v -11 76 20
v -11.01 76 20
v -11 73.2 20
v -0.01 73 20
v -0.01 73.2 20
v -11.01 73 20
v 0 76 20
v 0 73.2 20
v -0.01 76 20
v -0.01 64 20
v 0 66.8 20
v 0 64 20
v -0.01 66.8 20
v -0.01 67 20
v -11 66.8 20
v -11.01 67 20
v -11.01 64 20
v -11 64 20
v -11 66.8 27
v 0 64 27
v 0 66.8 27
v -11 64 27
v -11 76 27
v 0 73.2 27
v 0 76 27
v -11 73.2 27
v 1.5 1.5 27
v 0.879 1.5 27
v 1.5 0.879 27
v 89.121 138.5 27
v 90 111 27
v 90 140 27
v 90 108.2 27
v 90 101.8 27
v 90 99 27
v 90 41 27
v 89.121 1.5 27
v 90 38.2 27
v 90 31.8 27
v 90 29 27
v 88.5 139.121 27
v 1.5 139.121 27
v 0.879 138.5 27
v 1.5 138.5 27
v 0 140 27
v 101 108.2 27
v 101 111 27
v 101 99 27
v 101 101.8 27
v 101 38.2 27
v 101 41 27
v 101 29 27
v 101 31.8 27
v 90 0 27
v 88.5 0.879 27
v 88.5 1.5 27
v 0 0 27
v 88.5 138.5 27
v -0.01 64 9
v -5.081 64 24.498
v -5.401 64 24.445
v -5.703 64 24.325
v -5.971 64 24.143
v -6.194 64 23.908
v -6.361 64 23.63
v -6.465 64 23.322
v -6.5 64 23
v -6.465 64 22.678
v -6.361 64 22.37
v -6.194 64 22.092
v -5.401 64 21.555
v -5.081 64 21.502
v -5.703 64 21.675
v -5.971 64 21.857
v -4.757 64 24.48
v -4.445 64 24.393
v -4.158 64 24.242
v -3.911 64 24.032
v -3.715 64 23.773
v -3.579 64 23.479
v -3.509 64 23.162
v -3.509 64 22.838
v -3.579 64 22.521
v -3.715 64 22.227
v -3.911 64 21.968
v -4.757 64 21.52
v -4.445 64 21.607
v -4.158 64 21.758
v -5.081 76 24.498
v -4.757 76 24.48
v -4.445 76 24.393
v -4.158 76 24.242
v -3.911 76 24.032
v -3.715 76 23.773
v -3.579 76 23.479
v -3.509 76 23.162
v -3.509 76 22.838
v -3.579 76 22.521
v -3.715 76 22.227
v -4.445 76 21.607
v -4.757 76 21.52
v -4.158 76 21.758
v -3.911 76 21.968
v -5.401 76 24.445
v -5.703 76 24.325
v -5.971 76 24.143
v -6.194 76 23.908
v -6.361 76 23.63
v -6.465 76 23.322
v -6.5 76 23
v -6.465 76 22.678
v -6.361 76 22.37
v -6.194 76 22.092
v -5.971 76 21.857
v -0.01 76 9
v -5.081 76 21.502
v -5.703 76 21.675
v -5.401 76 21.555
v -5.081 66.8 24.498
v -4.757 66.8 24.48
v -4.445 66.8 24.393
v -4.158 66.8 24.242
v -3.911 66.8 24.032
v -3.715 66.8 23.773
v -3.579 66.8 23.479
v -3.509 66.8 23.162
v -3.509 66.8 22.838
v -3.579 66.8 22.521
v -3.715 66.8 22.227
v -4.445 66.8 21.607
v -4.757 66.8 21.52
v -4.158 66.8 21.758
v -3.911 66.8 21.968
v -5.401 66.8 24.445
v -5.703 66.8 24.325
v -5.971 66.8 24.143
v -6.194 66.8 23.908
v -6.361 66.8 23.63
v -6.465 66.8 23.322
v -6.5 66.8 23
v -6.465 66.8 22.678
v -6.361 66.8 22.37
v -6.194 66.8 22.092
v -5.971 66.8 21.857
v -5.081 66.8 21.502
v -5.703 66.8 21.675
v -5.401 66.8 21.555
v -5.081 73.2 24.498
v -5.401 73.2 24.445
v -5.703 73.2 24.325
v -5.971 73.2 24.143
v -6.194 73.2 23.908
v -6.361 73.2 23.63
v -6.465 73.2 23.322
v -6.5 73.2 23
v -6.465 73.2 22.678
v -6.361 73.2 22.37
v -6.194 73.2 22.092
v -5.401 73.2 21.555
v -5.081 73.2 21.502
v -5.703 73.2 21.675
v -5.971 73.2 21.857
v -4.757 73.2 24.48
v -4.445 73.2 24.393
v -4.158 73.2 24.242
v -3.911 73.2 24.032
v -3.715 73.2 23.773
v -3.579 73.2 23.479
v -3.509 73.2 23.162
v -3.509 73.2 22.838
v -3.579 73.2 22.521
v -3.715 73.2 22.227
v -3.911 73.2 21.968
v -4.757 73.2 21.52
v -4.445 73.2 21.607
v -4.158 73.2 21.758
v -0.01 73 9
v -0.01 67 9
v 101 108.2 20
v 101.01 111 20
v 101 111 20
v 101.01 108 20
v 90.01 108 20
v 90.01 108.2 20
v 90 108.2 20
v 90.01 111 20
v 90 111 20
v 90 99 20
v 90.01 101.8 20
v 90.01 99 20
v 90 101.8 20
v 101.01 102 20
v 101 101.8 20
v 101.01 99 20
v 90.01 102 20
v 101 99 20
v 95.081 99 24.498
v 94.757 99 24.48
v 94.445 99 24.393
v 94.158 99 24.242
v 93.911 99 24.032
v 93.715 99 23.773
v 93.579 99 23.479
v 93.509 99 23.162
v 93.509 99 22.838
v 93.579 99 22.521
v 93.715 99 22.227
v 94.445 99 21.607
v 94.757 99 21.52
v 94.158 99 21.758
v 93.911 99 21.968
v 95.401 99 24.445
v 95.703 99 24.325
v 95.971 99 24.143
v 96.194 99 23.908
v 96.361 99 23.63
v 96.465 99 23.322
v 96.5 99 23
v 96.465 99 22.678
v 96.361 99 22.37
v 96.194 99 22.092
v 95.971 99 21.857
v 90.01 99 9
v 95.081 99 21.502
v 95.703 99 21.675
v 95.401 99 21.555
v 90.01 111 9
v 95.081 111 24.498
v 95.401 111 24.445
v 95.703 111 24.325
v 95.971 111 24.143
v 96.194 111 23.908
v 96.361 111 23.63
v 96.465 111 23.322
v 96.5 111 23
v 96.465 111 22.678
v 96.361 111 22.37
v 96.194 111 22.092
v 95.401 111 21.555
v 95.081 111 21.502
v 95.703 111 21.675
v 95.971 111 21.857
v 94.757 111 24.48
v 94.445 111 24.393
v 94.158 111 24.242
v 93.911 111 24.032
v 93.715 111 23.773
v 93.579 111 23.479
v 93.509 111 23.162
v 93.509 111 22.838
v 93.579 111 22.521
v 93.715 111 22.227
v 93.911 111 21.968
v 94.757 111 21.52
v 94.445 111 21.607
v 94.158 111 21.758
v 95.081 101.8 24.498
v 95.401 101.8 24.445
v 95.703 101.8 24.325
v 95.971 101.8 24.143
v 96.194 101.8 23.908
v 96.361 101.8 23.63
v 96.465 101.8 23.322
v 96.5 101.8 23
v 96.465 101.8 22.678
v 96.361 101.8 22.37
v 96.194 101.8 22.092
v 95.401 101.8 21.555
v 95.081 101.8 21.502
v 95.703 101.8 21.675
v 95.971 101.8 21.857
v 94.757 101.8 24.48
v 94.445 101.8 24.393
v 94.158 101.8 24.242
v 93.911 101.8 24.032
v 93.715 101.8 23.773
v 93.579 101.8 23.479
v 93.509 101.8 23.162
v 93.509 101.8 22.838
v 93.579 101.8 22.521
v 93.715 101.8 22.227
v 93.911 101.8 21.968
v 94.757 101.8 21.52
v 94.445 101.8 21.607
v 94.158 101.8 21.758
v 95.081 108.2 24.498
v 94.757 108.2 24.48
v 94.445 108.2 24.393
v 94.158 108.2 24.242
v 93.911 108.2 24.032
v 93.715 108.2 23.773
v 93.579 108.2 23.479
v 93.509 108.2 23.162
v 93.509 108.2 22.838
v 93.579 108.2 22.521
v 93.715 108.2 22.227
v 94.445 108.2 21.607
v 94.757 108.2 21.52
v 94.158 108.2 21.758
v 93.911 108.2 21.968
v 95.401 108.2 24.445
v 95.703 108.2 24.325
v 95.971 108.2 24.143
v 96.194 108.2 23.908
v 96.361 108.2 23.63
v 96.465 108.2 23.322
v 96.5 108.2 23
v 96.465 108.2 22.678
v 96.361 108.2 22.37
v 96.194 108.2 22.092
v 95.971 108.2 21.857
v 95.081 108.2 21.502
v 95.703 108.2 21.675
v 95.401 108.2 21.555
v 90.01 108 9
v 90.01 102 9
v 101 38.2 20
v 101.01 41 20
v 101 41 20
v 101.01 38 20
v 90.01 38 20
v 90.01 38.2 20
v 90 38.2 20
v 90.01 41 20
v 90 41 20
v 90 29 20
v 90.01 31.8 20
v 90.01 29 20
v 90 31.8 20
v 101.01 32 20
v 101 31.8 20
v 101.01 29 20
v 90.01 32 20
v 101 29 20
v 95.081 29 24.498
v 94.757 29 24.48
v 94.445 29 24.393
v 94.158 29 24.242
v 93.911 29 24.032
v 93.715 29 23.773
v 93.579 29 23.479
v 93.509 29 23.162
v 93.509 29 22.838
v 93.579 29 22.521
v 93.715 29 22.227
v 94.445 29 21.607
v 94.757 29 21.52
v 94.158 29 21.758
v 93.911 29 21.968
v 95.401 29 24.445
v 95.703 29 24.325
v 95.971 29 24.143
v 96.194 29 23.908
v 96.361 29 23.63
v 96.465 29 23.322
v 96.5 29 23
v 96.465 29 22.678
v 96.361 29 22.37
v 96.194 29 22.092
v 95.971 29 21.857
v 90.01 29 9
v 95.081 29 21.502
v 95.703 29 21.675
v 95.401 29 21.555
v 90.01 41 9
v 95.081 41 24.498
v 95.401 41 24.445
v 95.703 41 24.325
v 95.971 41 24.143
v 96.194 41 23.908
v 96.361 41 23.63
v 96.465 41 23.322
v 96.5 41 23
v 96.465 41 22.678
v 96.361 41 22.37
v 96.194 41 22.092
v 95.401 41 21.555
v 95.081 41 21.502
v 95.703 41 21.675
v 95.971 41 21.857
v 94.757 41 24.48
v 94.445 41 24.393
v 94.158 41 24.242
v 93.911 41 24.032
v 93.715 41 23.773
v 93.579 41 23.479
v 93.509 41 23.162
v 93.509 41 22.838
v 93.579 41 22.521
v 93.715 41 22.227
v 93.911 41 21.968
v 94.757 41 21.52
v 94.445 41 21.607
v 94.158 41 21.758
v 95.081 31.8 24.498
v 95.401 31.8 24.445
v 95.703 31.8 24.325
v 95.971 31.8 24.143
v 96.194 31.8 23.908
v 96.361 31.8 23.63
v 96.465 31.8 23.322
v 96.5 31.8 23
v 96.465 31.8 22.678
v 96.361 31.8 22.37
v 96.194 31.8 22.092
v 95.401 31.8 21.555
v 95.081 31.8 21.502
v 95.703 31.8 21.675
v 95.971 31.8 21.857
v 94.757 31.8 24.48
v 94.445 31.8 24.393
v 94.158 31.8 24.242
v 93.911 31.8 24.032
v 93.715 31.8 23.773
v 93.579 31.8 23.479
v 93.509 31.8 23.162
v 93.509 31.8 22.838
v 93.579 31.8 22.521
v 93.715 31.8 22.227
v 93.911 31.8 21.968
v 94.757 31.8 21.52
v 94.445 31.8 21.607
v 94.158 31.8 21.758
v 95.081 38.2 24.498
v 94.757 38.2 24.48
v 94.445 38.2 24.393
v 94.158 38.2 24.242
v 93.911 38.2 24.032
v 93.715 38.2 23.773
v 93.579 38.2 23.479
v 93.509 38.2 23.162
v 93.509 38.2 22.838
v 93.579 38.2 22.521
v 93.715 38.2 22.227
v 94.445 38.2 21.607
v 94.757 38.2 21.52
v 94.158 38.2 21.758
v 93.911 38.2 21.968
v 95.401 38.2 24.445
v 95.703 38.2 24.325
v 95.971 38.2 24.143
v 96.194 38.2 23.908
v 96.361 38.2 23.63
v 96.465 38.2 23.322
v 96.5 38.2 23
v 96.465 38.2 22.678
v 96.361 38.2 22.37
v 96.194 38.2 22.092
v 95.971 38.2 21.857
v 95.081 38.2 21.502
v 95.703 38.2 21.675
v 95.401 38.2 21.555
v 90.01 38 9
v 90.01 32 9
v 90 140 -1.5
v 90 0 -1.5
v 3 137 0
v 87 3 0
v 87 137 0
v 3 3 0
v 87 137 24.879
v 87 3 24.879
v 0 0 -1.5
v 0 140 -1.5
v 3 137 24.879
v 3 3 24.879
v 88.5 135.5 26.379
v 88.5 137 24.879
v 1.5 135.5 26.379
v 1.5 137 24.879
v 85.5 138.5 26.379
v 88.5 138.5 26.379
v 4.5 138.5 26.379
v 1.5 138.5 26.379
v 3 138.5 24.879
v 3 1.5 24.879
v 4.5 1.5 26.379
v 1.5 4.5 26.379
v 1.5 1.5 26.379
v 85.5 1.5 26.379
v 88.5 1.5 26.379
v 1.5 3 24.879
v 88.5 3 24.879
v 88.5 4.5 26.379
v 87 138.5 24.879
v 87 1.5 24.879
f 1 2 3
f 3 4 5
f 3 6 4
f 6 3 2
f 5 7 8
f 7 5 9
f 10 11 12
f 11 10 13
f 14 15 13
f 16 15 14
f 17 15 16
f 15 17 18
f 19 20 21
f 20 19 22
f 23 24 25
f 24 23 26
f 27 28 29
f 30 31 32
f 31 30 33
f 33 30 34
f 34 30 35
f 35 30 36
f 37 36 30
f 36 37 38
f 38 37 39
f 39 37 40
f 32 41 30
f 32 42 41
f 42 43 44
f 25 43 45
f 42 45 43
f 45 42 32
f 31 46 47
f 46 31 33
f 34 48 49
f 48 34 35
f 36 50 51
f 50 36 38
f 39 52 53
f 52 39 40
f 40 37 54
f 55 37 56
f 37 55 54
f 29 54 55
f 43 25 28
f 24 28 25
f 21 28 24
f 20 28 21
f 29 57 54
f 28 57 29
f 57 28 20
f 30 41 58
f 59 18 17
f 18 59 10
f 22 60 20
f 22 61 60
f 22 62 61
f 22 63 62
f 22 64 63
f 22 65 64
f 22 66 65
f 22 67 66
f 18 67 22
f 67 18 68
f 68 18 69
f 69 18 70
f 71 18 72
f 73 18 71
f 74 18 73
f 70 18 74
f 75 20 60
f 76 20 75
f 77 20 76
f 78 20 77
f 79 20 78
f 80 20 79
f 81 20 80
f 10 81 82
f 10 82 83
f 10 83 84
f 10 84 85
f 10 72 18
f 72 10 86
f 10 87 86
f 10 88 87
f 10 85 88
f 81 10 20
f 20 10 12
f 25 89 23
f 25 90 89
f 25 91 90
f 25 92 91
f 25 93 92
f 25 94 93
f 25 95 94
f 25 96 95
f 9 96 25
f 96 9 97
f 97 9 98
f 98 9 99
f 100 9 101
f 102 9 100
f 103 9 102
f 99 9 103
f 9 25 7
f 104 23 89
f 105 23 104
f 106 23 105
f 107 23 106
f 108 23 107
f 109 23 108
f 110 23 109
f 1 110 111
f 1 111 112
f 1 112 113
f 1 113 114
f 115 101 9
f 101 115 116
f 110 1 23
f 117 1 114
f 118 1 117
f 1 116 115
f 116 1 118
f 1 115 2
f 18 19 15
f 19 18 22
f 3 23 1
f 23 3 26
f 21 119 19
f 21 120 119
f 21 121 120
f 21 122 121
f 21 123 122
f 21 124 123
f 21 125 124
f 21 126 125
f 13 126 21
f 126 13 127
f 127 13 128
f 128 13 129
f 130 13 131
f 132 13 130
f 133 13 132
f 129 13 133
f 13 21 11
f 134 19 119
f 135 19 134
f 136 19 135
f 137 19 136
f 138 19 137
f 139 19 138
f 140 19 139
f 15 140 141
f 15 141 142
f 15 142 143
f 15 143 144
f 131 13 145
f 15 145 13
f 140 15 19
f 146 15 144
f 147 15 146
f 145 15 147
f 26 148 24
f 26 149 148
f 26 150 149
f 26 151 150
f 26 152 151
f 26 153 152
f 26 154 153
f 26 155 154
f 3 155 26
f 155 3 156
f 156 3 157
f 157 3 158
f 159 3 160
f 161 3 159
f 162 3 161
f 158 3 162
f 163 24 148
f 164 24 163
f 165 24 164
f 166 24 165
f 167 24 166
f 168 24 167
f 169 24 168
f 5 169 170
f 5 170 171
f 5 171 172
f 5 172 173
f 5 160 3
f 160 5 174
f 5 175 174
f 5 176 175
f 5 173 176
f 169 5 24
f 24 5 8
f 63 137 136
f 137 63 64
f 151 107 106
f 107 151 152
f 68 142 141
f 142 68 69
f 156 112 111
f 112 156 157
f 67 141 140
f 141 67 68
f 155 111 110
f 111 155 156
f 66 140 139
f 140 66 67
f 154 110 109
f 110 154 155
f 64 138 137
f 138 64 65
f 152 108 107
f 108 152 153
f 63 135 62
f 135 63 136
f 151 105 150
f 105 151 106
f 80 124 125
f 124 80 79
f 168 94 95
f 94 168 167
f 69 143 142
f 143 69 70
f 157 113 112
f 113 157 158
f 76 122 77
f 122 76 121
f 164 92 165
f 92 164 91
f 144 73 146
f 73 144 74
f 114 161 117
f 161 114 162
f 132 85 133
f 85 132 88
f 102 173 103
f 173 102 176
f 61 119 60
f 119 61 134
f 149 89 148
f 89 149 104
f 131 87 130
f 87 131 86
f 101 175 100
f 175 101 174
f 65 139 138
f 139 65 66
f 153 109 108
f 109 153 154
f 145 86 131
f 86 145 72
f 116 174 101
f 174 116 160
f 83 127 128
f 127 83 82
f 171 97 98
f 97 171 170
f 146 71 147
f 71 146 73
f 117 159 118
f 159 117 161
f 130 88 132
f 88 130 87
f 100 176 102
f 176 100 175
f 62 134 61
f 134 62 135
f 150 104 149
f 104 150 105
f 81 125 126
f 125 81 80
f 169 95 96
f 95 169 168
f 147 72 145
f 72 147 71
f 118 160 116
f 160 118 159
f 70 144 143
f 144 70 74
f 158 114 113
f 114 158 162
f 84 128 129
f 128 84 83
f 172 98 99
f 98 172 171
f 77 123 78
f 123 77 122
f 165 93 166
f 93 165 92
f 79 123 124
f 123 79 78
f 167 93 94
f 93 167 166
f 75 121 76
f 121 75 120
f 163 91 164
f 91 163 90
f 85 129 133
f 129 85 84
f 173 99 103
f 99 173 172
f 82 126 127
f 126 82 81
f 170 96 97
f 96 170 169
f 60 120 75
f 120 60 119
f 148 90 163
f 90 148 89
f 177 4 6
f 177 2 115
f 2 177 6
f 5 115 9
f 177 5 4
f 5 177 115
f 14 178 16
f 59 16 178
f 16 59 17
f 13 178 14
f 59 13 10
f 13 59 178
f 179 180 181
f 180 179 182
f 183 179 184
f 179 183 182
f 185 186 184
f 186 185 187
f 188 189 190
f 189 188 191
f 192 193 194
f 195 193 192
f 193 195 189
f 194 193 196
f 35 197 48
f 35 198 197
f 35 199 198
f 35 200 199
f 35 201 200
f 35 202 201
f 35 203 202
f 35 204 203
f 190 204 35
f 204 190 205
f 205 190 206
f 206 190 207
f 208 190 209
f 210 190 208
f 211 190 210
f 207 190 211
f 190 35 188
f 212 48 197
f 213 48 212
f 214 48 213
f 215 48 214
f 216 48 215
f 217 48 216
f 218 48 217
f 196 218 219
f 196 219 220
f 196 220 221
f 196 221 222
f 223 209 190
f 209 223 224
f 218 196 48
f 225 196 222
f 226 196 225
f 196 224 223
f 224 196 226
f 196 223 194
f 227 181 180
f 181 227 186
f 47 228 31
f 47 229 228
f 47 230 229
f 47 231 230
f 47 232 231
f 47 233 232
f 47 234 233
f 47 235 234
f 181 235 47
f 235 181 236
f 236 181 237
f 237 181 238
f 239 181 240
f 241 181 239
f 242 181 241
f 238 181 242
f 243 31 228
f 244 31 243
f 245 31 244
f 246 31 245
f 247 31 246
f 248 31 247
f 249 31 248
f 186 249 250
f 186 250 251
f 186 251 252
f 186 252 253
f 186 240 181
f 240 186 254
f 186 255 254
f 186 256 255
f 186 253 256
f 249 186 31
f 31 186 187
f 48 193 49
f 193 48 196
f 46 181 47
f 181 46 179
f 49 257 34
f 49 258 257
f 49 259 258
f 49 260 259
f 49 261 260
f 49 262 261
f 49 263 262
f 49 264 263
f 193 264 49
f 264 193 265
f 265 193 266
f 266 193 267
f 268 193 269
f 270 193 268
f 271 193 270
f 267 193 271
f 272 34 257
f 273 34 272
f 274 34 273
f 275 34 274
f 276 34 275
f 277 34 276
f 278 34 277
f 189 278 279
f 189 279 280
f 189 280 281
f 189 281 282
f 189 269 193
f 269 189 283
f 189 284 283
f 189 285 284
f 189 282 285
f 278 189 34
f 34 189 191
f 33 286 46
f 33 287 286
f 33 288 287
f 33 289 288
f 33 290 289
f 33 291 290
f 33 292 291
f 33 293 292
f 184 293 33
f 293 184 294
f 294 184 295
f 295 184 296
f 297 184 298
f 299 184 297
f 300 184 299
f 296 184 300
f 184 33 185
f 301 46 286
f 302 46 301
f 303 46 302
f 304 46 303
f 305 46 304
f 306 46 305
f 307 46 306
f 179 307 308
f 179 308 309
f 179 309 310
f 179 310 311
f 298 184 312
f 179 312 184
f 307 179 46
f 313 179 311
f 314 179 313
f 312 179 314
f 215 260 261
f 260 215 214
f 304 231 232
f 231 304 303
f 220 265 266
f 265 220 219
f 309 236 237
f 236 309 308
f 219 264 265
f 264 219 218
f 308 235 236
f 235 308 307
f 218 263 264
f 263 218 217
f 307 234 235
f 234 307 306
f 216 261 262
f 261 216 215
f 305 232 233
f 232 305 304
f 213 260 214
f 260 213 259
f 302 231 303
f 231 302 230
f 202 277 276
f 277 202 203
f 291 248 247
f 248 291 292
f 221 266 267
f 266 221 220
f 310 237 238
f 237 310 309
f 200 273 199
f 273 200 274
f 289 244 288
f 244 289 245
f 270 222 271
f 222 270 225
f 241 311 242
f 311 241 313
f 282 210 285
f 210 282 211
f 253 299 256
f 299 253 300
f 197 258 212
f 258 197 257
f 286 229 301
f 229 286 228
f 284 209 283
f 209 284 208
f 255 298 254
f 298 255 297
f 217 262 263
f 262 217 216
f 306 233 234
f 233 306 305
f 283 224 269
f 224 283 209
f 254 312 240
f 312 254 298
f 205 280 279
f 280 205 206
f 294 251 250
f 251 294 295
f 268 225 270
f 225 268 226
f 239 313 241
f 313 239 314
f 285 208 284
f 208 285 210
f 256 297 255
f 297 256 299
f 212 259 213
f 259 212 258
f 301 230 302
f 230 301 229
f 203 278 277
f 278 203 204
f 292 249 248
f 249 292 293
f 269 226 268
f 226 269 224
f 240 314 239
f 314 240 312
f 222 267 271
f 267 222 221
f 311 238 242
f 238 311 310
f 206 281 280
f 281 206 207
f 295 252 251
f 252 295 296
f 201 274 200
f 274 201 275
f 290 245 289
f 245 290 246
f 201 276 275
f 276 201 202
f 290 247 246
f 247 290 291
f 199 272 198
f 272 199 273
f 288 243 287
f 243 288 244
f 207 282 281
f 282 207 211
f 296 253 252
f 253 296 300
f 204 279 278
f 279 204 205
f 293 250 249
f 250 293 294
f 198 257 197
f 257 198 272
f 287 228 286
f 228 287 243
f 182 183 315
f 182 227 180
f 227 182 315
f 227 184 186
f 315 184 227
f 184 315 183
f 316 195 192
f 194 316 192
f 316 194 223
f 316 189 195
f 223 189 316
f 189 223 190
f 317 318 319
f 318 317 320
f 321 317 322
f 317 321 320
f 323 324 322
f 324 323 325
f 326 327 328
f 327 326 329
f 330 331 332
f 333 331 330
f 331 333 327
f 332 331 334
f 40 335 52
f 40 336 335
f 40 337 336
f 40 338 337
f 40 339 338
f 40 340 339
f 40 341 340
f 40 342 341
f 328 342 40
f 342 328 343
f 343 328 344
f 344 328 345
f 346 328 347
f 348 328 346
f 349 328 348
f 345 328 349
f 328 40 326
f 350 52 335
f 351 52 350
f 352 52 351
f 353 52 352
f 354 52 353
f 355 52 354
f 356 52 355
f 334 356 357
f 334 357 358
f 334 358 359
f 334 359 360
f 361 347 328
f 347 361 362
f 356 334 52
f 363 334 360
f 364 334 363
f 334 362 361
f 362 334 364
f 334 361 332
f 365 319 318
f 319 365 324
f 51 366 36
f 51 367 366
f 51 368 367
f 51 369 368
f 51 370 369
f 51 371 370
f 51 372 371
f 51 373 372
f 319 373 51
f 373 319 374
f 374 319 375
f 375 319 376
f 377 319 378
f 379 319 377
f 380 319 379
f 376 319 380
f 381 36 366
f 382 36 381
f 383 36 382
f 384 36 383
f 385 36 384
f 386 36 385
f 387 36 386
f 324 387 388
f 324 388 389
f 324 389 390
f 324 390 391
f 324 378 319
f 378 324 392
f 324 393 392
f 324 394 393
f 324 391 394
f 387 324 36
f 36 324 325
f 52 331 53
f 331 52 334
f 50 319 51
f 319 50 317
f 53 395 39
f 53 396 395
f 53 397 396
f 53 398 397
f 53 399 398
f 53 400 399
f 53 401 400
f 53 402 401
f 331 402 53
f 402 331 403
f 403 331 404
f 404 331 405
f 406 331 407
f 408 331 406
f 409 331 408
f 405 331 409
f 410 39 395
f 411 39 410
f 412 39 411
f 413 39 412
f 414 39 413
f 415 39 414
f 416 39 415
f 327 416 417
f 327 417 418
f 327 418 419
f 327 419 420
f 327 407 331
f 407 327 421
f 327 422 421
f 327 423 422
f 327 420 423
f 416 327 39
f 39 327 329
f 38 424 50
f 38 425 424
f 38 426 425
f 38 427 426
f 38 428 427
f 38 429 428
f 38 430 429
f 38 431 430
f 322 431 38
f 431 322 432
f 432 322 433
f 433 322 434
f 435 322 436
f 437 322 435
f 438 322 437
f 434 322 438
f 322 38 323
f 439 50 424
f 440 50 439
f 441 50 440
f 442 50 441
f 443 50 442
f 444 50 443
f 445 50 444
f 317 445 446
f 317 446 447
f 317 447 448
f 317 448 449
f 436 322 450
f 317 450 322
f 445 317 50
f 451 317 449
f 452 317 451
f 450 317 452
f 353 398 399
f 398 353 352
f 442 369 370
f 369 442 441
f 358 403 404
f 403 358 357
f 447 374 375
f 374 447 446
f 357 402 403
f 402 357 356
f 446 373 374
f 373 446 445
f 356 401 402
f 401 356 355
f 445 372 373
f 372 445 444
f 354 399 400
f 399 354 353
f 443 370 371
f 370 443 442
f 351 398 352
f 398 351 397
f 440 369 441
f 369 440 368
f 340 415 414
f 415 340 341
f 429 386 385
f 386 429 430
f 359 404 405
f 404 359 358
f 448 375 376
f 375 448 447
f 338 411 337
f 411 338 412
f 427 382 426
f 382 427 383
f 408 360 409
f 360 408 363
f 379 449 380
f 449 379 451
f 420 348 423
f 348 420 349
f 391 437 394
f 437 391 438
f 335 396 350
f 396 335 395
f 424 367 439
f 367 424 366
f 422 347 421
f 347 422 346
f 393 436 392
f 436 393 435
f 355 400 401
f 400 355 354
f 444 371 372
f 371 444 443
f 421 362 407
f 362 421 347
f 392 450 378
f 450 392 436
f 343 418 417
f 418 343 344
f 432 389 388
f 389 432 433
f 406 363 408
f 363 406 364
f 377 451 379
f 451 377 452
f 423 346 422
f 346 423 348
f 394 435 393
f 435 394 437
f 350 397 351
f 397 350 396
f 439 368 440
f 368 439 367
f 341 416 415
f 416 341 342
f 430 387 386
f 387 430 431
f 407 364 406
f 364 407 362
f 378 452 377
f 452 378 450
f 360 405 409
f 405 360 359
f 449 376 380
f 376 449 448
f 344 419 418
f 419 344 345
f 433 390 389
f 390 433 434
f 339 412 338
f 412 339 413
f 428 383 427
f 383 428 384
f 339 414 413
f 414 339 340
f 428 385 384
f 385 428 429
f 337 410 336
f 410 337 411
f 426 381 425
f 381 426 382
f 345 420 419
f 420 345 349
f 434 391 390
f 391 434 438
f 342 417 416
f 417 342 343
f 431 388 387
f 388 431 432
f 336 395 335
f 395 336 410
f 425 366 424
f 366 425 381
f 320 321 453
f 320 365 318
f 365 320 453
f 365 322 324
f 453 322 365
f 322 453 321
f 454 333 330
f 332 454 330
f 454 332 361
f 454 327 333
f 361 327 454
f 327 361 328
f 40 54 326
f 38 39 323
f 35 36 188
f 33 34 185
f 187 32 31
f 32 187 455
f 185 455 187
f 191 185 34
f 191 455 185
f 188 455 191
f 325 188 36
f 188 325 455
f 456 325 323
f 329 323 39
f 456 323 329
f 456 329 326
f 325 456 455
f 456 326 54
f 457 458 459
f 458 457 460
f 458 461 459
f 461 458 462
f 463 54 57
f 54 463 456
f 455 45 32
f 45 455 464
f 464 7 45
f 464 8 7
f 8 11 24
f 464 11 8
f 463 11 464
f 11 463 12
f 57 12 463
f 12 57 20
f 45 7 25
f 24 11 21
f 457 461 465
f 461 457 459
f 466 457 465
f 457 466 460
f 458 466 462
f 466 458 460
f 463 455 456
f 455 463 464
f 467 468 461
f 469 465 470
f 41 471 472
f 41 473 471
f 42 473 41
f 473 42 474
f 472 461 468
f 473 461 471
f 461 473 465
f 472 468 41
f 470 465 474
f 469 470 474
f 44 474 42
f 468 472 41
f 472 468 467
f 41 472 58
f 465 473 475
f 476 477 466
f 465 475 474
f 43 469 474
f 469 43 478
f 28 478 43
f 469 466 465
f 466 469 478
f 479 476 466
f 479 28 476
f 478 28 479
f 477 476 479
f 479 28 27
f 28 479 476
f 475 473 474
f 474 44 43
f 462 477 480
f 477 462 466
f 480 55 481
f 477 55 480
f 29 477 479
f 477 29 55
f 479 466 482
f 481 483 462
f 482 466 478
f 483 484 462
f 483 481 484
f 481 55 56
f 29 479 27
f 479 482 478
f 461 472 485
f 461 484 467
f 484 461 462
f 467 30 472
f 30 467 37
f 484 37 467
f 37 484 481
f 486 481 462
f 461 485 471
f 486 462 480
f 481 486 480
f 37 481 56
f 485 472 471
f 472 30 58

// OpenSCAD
part="bracket"; // [plate,bracket,both,together,bracket_test]
//70x120x22
mw=90;
mh=140;
md=30;
hinge_arm=8;
hinge_offset=4;
hinge_hole=3;
thick=3;

//translate([0,0,-2]) cube([10,20,2]);
//plate();
//translate([0,mh,md]) rotate([0,180,180])
if(part=="both")
{
  translate([mw*2+hinge_arm+hinge_hole,0,md]) rotate([0,180,0]) bracket();
  plate();
}
else if(part=="plate") plate();
else if(part=="bracket") translate([0,mh,md]) rotate([0,180,180]) bracket();
else if(part=="together") { plate(); bracket(); }
else if(part=="bracket_test") { bracket_test(); }

module bracket_test() {
  translate([hinge_arm-hinge_hole,thick*3]) hinge2();
  cube([thick,thick*8,thick*3+hinge_arm]);
}
module bracket(){
  difference(){
    union(){
  translate([-1*(hinge_arm-hinge_hole-thick),mh/2-thick,thick]) mirror([1,0,0]) hinge2();
  translate([0,0,thick])
  {
      cube([mw,thick,md-thick]);
      cube([thick,mh,md-thick]);
    translate([0,mh-thick,0])
      cube([mw,thick,md-thick]);
    translate([mw-thick,0,0])
    {
      cube([thick,mh,md-thick]);
      translate([hinge_arm-thick,mh/4-thick,0])
        hinge2();
        translate([hinge_arm-thick,(mh/4)*3-thick,0]) hinge2();
    }
    translate([0,0,md-thick])
    {
        cube([mw,mh,thick/2]);
    }
  }
  }
  translate([mw/2,thick,thick]) rotate([45,0,0]) cube([mw-thick,thick,thick],center=true);
  translate([thick,mh/2,thick]) rotate([0,45,0]) cube([thick,mh-thick,thick],center=true);
  translate([mw/2,mh-thick,thick]) rotate([45,0,0]) cube([mw-thick,thick,thick],center=true);
  translate([mw-thick,mh/2,thick]) rotate([0,45,0]) cube([thick,mh-thick,thick],center=true);
}
}

module plate() {
  translate([thick*2,thick*2,0]) screw_mount();
  translate([thick*2,mh-thick*4,0]) screw_mount();
  translate([mw-thick*4,mh-thick*4,0]) screw_mount();
  translate([mw-thick*4,thick*2,0]) screw_mount();
  translate([-1*(hinge_arm-hinge_hole-thick),mh/2-thick,thick]) mirror([1,0,0]) hinge();
difference(){
  cube([mw,mh,thick]);
  translate([thick*2,thick*2,-0.01]) cube([mw-thick*4,mh-thick*4,thick+0.02]);
}
translate([thick,thick,thick])
  cube([mw-thick*2,thick,1]);
translate([thick,thick,thick])
  cube([thick,mh-thick*2,1]);
translate([mw-thick*2,thick,thick]) {
  cube([thick,mh-thick*2,1]);
  translate([hinge_arm,mh/4-thick*2,0]) hinge();
  translate([hinge_arm,(mh/4)*3-thick*2,0]) hinge();
}
translate([thick,mh-thick*2,thick])
  cube([mw-thick*2,thick,1]);
}

module screw_mount()
{
  difference(){
    translate([3,3,0]) cylinder(d=8,h=thick,$fn=30);
    translate([3,3,-0.01]) cylinder(d=3,h=thick+0.02,$fn=30);
    translate([3,3,thick/2]) cylinder(d1=3,d2=5,h=thick/2+0.01,$fn=40);
  }
}

module hinge(){
    translate([hinge_arm*-1+0.01,0,thick*-1])
      cube([hinge_arm+thick+hinge_hole-0.01,thick*2,thick]);
    difference(){
      union(){
        cube([thick+hinge_hole,thick*2,hinge_offset]);
        translate([(thick+hinge_hole)/2,thick*2,hinge_offset]) rotate([90,0,0]) cylinder(d=thick+hinge_hole,h=thick*2,$fn=20);
      }
      translate([(thick+hinge_hole)/2,thick*3,hinge_offset]) rotate([90,0,0]) cylinder(d=hinge_hole,h=thick*4,$fn=20);
    }
}

module hinge_ramp() {
    hinge_ramp=hinge_arm+hinge_hole;
  translate([hinge_arm*-1+thick*2+0.01,0,hinge_hole+hinge_offset]) rotate([90,0,0]) linear_extrude(thick) polygon([[0,0],[hinge_ramp,0],[0,hinge_ramp]]);
}
module hinge2(){
  hinge_ramp();
  translate([0,thick*3]) hinge_ramp();
  difference(){
    union(){
      translate([hinge_arm*-1+thick+0.01,thick*-1,0])
        cube([hinge_arm+hinge_hole-0.01,thick*4,hinge_hole+hinge_offset]);
      translate([0,thick*-1,0])
      {
        cube([thick*2+hinge_hole,thick*4,hinge_offset+hinge_hole]);
//        translate([(thick+hinge_hole)/2,thick*4,hinge_offset]) rotate([90,0,0]) cylinder(d=thick+hinge_hole,h=thick*4,$fn=20);
      }
    }
    translate([-1*thick,-0.2,0])
      cube([hinge_arm+thick*2,thick*2+0.4,hinge_offset+thick*2]);
    translate([(thick+hinge_hole)/2,thick*4,hinge_offset]) rotate([90,0,0]) cylinder(d=hinge_hole,h=thick*8,$fn=29);
  }
}


//cube([mw,mh,md]);
